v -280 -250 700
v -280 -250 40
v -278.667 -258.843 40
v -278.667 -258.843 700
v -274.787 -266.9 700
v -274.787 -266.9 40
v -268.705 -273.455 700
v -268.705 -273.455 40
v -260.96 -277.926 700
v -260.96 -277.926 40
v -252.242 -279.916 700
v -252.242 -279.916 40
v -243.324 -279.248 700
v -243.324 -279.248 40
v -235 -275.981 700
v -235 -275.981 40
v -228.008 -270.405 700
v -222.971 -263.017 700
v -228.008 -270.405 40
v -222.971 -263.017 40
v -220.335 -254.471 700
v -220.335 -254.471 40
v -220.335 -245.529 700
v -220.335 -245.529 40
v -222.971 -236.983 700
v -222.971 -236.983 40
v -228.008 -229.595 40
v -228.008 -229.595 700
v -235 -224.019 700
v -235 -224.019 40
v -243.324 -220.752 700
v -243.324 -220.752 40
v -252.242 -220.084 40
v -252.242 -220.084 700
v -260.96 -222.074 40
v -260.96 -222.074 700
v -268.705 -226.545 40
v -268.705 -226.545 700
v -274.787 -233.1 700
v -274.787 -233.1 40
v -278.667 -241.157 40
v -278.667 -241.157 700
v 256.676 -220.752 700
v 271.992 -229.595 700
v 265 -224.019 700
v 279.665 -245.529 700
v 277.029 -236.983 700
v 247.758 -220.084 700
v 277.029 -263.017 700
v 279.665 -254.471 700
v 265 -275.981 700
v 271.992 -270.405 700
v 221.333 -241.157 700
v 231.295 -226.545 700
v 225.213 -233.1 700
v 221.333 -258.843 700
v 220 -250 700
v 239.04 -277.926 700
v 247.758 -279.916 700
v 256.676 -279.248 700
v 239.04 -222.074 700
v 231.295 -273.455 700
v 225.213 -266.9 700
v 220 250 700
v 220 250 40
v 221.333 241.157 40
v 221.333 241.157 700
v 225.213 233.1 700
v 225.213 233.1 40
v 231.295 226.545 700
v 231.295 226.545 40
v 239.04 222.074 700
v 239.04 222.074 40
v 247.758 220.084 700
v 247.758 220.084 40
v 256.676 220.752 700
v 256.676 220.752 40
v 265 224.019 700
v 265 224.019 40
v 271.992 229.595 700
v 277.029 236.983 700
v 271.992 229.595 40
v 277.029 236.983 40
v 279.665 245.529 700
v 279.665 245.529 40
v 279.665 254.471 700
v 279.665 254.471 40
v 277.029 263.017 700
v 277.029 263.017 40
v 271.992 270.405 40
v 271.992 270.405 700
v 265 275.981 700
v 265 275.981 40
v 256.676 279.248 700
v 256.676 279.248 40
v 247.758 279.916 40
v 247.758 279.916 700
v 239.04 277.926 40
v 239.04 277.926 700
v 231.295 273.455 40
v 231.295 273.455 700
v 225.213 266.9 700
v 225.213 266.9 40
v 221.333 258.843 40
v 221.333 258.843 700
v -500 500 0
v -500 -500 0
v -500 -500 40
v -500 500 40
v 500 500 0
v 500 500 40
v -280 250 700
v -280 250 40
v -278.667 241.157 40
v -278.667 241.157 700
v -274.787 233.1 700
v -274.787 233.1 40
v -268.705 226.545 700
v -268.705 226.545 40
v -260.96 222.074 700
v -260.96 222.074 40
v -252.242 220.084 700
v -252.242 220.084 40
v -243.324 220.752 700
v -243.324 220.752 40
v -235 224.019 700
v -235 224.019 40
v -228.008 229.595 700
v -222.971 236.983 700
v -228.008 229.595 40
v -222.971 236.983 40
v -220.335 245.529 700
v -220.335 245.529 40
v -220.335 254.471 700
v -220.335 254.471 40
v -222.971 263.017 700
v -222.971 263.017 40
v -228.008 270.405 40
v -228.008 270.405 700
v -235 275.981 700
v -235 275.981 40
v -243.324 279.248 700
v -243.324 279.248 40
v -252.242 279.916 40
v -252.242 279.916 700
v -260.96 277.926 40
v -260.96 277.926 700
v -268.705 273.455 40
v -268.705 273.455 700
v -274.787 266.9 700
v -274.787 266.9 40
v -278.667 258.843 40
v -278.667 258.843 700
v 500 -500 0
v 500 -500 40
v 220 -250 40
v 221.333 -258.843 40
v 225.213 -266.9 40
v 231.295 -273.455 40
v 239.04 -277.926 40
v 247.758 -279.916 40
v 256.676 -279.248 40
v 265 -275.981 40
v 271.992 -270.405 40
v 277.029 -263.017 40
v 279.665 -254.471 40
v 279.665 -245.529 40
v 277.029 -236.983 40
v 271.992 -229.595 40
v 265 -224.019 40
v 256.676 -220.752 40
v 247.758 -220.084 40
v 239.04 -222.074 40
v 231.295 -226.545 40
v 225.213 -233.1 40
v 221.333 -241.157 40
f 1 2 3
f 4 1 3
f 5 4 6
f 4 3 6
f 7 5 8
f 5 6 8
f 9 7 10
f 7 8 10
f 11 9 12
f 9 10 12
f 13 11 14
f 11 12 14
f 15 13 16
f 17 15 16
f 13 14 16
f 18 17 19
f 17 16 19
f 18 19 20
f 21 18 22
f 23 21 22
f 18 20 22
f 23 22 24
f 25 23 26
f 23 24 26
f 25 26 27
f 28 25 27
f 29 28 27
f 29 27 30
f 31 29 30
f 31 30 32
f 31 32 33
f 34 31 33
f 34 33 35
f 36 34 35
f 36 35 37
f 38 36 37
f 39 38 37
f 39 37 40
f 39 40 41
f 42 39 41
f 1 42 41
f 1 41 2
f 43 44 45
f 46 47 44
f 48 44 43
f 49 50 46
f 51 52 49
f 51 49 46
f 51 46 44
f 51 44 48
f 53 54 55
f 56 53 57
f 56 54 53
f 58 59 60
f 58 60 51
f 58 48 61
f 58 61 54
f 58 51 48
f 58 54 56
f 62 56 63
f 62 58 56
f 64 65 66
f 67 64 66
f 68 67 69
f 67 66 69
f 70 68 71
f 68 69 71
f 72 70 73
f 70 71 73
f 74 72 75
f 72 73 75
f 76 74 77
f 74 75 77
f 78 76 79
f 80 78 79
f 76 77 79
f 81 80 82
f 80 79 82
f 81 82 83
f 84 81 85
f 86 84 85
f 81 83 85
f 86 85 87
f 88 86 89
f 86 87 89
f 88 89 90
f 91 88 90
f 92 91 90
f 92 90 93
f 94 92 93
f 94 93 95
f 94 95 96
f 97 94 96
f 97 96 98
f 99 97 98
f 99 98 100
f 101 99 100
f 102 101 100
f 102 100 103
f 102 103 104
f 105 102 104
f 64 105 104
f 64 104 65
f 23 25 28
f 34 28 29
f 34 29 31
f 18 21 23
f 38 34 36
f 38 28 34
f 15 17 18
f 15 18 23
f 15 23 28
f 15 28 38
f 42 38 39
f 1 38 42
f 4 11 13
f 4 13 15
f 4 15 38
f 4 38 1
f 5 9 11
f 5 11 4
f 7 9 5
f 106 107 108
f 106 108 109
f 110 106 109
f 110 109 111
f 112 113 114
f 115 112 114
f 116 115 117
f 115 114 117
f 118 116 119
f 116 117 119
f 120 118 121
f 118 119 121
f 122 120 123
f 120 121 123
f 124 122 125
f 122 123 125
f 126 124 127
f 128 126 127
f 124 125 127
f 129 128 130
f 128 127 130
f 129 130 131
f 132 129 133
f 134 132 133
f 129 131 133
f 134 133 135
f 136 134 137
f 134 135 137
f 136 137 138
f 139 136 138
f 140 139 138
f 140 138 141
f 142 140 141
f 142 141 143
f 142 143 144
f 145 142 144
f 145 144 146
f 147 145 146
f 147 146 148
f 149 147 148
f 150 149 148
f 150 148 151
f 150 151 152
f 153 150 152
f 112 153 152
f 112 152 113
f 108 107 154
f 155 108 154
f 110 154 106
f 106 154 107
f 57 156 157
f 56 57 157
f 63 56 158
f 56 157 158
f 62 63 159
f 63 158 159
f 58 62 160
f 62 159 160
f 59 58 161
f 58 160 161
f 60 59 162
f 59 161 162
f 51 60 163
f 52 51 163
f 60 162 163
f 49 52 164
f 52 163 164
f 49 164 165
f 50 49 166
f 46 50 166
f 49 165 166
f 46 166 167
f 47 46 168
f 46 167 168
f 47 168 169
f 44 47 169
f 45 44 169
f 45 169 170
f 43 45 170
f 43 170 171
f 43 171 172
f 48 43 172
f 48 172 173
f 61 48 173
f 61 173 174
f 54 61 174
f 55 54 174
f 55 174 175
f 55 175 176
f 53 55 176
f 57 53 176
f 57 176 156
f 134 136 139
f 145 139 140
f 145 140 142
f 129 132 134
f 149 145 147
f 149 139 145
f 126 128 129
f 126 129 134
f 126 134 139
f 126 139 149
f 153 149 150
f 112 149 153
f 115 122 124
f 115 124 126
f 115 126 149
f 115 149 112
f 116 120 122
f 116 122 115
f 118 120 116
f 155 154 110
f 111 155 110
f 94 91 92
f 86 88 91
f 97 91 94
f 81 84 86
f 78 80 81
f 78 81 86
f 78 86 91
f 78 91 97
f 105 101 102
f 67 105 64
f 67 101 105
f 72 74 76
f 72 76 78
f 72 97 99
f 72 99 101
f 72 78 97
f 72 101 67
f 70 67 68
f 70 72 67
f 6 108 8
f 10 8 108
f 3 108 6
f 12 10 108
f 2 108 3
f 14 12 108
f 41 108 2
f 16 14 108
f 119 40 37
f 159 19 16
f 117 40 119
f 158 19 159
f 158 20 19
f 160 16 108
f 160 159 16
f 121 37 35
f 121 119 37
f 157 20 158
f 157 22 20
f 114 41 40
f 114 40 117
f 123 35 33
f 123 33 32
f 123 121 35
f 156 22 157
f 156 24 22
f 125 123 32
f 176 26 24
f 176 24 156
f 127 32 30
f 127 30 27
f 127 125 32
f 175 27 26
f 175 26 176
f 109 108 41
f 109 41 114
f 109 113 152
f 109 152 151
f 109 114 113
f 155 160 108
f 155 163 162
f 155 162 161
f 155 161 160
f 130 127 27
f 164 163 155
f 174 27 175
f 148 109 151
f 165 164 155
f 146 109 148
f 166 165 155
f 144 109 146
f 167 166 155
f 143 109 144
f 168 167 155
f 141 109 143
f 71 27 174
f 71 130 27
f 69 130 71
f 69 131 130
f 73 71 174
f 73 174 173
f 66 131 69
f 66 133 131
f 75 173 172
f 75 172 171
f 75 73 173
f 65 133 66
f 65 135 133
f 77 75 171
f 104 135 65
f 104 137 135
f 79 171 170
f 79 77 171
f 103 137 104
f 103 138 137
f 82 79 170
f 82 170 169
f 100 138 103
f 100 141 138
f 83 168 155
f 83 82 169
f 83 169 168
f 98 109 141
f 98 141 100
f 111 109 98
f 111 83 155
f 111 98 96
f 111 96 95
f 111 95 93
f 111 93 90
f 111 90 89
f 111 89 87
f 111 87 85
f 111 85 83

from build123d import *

# Parameters (mm, degrees)
SKETCH_1_W      = 1000
SKETCH_1_H      = 1000
EXTRUDE_1_DEPTH = 40
SKETCH_2_R      = 30
EXTRUDE_2_DEPTH = 700
SKETCH_3_R      = 30
EXTRUDE_3_DEPTH = 700
SKETCH_4_R      = 30
EXTRUDE_4_DEPTH = 700
SKETCH_5_R      = 30
EXTRUDE_5_DEPTH = 700


with BuildPart() as part:
    # 草图1 → 凸台-拉伸1 (new body)
    with BuildSketch(Plane.XY):
        Rectangle(SKETCH_1_W, SKETCH_1_H)
    extrude(amount=EXTRUDE_1_DEPTH)

    # 草图2 → 凸台-拉伸2 (add)
    with BuildSketch(Plane.XY):
        with Locations(Location((-250, -250, 0), (0, 0, 180))):
            Circle(SKETCH_2_R)
    extrude(amount=EXTRUDE_2_DEPTH)

    # 草图3 → 凸台-拉伸3 (add)
    with BuildSketch(Plane.XY):
        with Locations(Location((250, -250, 0), (0, 0, 180))):
            Circle(SKETCH_3_R)
    extrude(amount=EXTRUDE_3_DEPTH)

    # 草图4 → 凸台-拉伸4 (add)
    with BuildSketch(Plane.XY):
        with Locations(Location((-250, 250, 0), (0, 0, 180))):
            Circle(SKETCH_4_R)
    extrude(amount=EXTRUDE_4_DEPTH)

    # 草图5 → 凸台-拉伸5 (add)
    with BuildSketch(Plane.XY):
        with Locations(Location((250, 250, 0), (0, 0, 180))):
            Circle(SKETCH_5_R)
    extrude(amount=EXTRUDE_5_DEPTH)


solid = part.part
